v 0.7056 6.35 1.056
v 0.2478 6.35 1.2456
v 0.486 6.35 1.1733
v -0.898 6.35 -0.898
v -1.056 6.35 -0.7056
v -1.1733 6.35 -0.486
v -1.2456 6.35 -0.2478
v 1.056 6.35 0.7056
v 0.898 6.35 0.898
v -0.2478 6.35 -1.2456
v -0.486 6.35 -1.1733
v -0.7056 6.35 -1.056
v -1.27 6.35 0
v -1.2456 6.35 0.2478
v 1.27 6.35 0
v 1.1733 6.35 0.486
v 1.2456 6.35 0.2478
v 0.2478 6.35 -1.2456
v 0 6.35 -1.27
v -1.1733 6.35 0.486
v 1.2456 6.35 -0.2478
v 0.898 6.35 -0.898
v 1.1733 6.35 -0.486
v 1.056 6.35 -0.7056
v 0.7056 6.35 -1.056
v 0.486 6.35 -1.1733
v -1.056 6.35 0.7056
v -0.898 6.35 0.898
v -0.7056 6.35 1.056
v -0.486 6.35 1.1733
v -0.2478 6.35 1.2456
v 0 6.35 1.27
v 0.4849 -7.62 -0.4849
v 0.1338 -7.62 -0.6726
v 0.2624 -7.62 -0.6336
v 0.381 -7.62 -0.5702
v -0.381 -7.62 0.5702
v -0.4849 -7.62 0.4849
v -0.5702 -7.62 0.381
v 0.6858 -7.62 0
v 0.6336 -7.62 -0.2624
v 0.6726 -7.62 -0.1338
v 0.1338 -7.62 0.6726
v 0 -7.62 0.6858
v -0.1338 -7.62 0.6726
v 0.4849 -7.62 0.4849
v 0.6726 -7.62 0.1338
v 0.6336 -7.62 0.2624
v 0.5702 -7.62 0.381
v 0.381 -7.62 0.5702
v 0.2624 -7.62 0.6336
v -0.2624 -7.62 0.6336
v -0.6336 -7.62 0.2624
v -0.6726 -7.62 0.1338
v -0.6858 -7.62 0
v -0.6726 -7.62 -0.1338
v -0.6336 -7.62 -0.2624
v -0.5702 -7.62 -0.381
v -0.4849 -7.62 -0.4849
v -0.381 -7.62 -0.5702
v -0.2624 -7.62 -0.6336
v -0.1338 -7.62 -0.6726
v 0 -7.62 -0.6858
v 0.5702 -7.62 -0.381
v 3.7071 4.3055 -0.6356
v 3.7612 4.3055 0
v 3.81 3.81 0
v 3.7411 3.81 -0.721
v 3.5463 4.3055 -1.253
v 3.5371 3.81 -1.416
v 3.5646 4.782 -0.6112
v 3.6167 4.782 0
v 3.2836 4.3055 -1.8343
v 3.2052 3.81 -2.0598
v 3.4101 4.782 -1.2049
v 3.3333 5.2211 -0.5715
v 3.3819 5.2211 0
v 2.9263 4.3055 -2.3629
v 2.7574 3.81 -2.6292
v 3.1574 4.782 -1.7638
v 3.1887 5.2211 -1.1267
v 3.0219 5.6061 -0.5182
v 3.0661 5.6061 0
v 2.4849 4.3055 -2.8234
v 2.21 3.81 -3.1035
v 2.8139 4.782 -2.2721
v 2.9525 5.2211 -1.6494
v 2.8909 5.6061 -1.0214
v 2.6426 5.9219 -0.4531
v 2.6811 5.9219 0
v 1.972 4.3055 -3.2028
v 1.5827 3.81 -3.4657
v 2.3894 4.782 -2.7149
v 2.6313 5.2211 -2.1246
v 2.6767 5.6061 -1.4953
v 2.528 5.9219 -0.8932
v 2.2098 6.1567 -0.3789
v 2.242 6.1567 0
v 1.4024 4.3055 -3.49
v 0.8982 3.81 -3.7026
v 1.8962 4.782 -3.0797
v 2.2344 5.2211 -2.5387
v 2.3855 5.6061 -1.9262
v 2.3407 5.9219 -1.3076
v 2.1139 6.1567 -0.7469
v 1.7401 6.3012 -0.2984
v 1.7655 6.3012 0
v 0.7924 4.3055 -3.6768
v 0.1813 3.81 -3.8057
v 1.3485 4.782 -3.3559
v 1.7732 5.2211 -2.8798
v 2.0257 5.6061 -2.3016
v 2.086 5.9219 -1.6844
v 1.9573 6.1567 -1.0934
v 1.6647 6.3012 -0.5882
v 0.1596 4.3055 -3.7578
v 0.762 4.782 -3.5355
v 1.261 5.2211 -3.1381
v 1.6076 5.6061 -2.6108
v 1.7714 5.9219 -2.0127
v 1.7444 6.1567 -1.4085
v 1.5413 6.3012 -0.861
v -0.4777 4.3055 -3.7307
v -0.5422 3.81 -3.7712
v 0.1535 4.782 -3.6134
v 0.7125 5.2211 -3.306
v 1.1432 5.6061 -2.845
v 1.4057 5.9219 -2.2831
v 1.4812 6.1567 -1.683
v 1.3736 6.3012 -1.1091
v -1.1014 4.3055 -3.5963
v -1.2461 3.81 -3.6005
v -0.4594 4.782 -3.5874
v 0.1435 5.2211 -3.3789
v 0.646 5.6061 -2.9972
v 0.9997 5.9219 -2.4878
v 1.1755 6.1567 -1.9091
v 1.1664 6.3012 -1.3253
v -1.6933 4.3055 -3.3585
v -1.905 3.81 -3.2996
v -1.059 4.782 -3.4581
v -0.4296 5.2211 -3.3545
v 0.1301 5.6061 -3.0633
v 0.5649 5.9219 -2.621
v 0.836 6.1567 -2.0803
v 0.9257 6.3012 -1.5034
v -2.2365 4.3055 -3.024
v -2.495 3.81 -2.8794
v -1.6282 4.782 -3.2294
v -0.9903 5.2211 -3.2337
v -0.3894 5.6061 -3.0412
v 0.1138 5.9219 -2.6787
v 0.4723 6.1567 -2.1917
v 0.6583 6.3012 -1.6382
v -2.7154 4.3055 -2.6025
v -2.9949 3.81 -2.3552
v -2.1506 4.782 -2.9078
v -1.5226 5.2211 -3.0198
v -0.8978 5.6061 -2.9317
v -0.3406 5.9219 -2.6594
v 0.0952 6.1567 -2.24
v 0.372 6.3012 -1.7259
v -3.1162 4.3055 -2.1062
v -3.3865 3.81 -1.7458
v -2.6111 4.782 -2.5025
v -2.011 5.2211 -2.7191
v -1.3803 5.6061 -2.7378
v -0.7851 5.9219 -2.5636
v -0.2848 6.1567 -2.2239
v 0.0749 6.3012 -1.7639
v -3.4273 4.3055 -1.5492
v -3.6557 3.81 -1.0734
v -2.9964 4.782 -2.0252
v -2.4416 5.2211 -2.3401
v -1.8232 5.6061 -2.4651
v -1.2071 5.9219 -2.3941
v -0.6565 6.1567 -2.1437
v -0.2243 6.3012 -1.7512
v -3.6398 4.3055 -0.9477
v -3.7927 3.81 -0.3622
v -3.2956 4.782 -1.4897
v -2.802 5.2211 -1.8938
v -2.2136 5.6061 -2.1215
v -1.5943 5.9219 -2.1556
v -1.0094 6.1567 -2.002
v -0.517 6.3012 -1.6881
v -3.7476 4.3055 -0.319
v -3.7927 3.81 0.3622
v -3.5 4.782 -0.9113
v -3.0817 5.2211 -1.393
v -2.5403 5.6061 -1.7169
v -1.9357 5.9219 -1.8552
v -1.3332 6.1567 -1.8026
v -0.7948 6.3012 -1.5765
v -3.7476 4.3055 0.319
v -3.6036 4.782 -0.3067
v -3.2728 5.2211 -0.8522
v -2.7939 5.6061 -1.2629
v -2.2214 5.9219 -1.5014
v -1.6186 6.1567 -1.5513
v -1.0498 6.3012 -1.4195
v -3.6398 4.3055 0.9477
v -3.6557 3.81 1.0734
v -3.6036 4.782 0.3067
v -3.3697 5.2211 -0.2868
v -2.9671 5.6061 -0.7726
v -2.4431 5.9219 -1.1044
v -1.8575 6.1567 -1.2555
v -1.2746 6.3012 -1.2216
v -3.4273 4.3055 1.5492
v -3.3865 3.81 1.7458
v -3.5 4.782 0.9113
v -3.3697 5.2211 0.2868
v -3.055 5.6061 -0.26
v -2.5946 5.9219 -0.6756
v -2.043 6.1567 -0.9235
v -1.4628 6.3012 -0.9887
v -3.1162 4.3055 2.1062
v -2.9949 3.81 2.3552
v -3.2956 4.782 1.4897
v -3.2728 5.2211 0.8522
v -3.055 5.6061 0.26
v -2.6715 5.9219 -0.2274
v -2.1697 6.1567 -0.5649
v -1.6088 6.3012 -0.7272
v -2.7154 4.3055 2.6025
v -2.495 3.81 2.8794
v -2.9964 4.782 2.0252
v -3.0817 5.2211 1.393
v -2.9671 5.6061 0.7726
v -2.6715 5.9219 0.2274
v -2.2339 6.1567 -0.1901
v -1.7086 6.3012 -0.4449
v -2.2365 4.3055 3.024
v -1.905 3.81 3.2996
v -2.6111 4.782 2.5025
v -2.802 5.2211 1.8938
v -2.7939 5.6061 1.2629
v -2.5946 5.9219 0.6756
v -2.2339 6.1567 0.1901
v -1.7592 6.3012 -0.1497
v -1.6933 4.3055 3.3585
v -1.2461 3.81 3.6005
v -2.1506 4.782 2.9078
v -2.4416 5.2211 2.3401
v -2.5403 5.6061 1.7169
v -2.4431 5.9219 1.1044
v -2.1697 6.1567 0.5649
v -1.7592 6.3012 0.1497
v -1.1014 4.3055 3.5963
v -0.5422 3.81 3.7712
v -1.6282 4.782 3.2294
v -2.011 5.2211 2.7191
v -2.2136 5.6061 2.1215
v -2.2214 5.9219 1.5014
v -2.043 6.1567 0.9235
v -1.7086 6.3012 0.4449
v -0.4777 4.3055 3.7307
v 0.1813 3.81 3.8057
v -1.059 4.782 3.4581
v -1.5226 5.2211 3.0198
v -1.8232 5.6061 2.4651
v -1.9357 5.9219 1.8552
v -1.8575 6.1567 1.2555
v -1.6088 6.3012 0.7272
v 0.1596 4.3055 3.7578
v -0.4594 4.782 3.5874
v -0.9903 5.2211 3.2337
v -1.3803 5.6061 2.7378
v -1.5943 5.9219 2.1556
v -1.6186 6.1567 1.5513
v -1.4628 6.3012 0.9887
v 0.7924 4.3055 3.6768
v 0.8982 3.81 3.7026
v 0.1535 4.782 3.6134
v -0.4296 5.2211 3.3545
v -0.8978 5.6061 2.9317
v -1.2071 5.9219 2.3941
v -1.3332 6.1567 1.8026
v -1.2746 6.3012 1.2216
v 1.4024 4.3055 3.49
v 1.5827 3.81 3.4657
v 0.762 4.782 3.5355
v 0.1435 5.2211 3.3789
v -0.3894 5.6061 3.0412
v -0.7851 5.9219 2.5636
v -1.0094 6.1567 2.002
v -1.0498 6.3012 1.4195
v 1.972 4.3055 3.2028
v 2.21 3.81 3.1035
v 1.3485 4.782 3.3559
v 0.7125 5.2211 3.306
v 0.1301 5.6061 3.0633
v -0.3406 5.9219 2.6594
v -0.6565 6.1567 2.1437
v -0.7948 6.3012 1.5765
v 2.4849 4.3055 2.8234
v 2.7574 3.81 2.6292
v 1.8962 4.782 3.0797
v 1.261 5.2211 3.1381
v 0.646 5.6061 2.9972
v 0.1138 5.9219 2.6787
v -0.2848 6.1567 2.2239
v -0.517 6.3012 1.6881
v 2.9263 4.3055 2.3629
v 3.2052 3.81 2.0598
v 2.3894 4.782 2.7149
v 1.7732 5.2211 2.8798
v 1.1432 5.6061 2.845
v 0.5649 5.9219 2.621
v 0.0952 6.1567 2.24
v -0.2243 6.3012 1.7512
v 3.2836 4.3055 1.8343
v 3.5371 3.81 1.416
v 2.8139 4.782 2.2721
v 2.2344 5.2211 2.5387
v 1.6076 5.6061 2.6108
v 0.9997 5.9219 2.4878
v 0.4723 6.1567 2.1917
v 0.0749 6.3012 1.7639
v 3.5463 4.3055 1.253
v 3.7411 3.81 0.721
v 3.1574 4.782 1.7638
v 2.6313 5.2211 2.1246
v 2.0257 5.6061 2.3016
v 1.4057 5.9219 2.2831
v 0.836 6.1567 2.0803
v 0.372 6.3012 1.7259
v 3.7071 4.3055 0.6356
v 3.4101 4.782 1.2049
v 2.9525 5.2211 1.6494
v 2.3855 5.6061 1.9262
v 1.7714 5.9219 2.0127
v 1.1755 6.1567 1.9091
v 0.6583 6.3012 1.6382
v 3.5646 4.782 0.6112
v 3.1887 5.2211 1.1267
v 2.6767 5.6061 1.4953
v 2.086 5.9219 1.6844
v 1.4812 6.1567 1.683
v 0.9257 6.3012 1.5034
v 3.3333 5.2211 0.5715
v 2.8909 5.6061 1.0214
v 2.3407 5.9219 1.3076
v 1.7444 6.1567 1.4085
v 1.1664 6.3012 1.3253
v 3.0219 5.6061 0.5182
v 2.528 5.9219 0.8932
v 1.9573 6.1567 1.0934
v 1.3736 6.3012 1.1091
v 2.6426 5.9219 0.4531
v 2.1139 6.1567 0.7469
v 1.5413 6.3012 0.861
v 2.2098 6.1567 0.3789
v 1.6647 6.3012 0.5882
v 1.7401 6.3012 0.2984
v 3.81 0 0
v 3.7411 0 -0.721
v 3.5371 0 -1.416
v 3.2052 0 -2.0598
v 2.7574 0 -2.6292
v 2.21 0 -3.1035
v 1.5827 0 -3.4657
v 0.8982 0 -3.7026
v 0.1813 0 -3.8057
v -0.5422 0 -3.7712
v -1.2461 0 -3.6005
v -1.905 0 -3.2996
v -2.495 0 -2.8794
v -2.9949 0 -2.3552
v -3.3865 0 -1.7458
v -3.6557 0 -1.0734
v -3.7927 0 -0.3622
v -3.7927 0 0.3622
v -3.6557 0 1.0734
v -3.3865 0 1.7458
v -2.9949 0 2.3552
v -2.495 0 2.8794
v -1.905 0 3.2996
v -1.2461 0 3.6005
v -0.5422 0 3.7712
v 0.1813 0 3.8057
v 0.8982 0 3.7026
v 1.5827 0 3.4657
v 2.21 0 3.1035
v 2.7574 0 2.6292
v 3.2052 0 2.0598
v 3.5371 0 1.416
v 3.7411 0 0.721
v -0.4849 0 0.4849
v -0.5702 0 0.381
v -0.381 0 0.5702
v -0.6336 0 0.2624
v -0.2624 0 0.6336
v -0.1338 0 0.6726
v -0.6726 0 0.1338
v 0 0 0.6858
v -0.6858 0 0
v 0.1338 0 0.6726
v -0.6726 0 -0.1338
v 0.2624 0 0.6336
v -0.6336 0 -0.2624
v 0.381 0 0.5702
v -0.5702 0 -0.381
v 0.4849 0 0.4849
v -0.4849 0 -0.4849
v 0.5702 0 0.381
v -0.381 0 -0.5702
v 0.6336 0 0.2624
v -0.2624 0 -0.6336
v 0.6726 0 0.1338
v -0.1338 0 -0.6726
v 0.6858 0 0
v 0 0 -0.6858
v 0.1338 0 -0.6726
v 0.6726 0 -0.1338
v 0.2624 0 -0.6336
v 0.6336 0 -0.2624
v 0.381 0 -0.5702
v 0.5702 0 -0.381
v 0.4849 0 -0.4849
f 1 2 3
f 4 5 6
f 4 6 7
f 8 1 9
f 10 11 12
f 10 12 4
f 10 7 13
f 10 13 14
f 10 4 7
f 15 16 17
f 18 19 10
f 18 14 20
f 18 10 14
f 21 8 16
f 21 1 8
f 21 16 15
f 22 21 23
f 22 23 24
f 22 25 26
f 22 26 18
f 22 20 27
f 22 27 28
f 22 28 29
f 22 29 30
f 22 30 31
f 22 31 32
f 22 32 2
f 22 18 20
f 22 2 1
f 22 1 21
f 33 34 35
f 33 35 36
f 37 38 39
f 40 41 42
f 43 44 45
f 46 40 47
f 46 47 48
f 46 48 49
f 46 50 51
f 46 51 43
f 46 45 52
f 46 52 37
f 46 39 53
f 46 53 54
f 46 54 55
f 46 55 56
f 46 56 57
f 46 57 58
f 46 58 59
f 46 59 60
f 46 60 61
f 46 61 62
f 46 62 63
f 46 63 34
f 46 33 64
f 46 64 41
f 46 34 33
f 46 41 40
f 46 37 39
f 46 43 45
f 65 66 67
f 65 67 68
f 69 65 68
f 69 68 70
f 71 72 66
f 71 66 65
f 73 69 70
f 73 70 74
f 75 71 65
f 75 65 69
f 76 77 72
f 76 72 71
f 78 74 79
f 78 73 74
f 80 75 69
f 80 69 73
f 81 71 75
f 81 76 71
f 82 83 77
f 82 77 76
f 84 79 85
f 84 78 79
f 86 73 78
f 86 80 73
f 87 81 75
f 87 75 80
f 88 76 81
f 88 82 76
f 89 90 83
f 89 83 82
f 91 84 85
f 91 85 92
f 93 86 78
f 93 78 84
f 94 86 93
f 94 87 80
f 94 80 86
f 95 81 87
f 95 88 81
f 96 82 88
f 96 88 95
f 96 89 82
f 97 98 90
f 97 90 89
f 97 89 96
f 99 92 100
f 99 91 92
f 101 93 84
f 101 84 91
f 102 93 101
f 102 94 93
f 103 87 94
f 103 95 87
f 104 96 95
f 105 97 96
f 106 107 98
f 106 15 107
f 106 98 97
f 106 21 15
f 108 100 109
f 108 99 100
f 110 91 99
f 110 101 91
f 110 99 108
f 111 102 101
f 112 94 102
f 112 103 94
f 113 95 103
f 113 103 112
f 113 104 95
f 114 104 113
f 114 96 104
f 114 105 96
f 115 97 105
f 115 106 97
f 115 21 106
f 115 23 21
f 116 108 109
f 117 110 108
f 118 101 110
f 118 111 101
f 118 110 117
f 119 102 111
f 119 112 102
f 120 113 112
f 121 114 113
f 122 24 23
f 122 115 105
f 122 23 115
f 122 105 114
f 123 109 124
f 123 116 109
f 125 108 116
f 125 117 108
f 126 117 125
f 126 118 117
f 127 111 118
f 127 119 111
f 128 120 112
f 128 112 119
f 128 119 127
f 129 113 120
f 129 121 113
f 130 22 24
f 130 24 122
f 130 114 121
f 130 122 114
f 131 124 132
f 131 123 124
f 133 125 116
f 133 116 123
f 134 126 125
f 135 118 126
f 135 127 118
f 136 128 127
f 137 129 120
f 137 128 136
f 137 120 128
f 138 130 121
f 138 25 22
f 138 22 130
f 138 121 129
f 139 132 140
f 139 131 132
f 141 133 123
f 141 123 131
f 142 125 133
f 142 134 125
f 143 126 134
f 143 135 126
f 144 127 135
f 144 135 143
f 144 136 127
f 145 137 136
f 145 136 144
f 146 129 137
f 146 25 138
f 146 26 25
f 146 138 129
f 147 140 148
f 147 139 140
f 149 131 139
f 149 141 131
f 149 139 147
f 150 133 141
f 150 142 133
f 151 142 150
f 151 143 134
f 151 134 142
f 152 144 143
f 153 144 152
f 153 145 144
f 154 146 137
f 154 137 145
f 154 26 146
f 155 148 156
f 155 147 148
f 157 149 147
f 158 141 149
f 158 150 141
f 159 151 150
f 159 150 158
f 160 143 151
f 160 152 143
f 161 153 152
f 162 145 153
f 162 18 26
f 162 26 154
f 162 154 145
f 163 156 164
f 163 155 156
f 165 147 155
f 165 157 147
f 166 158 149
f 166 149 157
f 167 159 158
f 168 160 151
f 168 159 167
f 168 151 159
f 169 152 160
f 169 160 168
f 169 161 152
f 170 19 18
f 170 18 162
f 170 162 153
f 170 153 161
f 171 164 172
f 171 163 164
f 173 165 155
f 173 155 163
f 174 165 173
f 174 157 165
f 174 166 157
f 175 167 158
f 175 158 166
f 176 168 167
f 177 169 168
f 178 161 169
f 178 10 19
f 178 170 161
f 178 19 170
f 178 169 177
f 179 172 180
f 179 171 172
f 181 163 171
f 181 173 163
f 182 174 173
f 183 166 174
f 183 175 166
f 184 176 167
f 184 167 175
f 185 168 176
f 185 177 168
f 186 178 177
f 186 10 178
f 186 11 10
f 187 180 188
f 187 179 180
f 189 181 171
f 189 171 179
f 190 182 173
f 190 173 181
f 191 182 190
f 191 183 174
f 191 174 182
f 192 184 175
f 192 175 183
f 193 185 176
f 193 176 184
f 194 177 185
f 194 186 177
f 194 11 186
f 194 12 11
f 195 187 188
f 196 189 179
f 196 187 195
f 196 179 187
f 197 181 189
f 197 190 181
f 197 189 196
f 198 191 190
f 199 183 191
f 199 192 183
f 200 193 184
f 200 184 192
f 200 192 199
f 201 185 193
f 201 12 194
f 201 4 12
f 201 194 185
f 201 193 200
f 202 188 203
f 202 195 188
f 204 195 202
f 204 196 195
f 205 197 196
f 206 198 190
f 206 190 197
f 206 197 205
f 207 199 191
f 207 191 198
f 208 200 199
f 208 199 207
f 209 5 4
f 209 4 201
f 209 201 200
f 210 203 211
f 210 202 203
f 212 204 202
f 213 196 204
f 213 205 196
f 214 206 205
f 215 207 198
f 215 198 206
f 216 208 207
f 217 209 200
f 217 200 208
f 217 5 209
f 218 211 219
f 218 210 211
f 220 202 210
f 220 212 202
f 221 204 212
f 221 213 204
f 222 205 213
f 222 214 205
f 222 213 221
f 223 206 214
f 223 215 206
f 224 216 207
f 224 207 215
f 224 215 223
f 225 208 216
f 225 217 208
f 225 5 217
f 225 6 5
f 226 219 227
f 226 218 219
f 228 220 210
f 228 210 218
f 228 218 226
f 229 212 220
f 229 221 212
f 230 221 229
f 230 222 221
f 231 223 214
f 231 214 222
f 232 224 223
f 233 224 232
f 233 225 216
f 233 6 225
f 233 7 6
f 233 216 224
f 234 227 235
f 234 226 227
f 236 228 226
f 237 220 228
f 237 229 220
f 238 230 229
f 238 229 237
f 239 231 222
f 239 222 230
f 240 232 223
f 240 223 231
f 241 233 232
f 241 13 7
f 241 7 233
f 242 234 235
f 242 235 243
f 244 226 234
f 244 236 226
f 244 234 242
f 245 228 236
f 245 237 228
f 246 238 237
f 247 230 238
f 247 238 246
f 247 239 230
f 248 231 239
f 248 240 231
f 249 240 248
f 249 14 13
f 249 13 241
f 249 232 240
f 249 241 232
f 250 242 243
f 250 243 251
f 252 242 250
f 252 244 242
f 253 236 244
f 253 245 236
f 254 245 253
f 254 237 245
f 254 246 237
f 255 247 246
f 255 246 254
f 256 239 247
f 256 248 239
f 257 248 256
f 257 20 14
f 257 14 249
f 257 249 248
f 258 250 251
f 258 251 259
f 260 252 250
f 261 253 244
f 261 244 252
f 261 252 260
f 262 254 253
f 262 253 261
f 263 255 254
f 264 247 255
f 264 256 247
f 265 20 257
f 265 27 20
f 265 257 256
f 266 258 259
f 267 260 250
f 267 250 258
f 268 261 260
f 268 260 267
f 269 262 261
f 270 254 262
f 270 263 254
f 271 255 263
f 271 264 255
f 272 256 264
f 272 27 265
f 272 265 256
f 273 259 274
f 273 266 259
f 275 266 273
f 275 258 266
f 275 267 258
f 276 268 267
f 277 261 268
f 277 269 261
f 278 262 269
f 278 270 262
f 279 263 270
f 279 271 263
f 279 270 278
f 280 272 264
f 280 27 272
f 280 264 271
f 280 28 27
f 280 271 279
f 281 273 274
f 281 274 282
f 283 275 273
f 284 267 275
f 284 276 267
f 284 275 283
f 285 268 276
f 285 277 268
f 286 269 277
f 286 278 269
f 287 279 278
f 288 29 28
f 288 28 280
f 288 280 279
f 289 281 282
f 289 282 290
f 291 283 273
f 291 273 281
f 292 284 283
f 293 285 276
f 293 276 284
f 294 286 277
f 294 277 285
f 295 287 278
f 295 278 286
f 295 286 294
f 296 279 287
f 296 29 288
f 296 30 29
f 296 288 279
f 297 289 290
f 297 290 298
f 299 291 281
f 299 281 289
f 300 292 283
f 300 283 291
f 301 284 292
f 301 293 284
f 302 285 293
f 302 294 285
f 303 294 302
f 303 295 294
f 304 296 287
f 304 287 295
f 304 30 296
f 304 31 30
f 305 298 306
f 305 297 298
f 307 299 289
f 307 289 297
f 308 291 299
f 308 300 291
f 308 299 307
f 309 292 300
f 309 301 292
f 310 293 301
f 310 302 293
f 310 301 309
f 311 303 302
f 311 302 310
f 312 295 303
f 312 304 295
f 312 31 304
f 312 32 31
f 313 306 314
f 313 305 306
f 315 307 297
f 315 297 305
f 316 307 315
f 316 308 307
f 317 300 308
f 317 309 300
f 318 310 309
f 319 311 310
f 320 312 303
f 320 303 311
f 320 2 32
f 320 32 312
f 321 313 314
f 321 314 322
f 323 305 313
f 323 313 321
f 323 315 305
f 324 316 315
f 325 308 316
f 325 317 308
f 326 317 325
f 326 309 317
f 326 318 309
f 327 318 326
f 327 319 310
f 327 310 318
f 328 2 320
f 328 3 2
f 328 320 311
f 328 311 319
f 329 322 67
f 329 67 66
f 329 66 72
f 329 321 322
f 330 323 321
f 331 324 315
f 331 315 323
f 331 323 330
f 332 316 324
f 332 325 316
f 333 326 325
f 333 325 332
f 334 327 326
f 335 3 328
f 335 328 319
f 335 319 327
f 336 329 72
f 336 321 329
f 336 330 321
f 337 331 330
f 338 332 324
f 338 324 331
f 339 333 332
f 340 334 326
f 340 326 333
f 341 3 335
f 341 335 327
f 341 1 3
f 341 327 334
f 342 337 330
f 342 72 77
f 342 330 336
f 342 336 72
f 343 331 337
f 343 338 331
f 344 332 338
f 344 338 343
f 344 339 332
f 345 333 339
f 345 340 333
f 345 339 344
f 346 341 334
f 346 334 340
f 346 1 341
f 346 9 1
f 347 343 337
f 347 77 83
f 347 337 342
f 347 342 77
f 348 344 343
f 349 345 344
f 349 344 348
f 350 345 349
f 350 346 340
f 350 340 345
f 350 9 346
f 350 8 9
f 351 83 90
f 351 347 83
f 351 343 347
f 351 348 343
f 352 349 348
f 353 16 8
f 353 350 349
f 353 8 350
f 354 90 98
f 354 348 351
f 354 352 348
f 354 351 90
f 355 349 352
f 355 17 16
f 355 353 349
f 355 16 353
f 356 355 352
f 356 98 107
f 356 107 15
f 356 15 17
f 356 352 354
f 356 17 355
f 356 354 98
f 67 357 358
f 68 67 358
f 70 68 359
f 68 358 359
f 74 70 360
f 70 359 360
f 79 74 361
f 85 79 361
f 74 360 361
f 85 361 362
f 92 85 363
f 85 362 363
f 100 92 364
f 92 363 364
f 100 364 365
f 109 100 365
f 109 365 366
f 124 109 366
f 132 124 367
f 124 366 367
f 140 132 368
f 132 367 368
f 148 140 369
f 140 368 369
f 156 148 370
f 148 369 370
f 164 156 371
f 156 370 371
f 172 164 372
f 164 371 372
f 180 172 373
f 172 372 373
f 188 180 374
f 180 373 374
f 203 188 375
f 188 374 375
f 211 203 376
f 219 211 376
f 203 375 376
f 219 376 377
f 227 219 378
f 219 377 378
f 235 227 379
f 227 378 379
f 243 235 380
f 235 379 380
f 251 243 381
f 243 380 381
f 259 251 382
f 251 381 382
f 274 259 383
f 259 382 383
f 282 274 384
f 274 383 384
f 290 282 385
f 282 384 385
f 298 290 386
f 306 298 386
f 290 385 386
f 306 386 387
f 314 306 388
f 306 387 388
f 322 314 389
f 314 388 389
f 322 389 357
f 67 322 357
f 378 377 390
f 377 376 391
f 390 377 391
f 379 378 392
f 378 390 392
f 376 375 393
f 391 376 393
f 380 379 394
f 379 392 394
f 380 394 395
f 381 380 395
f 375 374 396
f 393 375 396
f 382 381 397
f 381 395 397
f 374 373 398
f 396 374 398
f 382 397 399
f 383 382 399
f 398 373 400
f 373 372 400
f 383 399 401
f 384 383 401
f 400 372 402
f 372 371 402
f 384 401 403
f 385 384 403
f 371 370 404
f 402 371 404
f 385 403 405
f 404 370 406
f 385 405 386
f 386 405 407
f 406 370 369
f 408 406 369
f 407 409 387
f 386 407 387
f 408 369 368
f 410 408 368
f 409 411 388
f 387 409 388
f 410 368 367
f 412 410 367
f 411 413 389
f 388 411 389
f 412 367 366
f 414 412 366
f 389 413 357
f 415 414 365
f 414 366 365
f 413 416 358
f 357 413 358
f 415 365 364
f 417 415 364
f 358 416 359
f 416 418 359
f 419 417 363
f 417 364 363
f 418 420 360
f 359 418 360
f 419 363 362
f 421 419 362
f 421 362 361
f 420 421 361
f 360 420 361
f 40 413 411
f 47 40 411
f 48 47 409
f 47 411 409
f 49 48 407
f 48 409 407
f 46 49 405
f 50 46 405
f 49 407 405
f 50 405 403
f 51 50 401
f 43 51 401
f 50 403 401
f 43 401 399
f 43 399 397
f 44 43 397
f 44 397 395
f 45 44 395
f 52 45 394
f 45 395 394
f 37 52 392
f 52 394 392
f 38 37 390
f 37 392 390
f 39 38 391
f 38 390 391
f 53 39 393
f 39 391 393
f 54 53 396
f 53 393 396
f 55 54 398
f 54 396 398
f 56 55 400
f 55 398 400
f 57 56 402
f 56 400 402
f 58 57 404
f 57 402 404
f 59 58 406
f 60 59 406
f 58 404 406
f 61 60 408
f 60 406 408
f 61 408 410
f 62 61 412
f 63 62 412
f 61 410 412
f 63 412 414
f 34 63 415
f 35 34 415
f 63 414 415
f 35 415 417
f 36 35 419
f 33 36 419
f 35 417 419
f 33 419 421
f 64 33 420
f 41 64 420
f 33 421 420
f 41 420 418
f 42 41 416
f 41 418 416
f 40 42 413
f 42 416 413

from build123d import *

# Parameters (mm, degrees)
SKETCH1_R           = 3.81
BOSS_EXTRUDE1_DEPTH = 6.35
SKETCH2_R           = 0.6858
BOSS_EXTRUDE2_DEPTH = 7.62
FILLET1_R           = 2.54


with BuildPart() as part:
    # Sketch1 → Boss-Extrude1 (new body)
    with BuildSketch(Plane(origin=(0, 0, 0), x_dir=(1, 0, 0), z_dir=(0, 1, 0))):
        Circle(SKETCH1_R)
    extrude(amount=BOSS_EXTRUDE1_DEPTH)

    # Sketch2 → Boss-Extrude2 (add)
    with BuildSketch(Plane.XZ):
        Circle(SKETCH2_R)
    extrude(amount=BOSS_EXTRUDE2_DEPTH)

    # Fillet1
    fillet1_edges = [part.edges().sort_by_distance(p)[0] for p in [
        (-3.81, 6.35, 0),
    ]]
    fillet(fillet1_edges, radius=FILLET1_R)


solid = part.part
